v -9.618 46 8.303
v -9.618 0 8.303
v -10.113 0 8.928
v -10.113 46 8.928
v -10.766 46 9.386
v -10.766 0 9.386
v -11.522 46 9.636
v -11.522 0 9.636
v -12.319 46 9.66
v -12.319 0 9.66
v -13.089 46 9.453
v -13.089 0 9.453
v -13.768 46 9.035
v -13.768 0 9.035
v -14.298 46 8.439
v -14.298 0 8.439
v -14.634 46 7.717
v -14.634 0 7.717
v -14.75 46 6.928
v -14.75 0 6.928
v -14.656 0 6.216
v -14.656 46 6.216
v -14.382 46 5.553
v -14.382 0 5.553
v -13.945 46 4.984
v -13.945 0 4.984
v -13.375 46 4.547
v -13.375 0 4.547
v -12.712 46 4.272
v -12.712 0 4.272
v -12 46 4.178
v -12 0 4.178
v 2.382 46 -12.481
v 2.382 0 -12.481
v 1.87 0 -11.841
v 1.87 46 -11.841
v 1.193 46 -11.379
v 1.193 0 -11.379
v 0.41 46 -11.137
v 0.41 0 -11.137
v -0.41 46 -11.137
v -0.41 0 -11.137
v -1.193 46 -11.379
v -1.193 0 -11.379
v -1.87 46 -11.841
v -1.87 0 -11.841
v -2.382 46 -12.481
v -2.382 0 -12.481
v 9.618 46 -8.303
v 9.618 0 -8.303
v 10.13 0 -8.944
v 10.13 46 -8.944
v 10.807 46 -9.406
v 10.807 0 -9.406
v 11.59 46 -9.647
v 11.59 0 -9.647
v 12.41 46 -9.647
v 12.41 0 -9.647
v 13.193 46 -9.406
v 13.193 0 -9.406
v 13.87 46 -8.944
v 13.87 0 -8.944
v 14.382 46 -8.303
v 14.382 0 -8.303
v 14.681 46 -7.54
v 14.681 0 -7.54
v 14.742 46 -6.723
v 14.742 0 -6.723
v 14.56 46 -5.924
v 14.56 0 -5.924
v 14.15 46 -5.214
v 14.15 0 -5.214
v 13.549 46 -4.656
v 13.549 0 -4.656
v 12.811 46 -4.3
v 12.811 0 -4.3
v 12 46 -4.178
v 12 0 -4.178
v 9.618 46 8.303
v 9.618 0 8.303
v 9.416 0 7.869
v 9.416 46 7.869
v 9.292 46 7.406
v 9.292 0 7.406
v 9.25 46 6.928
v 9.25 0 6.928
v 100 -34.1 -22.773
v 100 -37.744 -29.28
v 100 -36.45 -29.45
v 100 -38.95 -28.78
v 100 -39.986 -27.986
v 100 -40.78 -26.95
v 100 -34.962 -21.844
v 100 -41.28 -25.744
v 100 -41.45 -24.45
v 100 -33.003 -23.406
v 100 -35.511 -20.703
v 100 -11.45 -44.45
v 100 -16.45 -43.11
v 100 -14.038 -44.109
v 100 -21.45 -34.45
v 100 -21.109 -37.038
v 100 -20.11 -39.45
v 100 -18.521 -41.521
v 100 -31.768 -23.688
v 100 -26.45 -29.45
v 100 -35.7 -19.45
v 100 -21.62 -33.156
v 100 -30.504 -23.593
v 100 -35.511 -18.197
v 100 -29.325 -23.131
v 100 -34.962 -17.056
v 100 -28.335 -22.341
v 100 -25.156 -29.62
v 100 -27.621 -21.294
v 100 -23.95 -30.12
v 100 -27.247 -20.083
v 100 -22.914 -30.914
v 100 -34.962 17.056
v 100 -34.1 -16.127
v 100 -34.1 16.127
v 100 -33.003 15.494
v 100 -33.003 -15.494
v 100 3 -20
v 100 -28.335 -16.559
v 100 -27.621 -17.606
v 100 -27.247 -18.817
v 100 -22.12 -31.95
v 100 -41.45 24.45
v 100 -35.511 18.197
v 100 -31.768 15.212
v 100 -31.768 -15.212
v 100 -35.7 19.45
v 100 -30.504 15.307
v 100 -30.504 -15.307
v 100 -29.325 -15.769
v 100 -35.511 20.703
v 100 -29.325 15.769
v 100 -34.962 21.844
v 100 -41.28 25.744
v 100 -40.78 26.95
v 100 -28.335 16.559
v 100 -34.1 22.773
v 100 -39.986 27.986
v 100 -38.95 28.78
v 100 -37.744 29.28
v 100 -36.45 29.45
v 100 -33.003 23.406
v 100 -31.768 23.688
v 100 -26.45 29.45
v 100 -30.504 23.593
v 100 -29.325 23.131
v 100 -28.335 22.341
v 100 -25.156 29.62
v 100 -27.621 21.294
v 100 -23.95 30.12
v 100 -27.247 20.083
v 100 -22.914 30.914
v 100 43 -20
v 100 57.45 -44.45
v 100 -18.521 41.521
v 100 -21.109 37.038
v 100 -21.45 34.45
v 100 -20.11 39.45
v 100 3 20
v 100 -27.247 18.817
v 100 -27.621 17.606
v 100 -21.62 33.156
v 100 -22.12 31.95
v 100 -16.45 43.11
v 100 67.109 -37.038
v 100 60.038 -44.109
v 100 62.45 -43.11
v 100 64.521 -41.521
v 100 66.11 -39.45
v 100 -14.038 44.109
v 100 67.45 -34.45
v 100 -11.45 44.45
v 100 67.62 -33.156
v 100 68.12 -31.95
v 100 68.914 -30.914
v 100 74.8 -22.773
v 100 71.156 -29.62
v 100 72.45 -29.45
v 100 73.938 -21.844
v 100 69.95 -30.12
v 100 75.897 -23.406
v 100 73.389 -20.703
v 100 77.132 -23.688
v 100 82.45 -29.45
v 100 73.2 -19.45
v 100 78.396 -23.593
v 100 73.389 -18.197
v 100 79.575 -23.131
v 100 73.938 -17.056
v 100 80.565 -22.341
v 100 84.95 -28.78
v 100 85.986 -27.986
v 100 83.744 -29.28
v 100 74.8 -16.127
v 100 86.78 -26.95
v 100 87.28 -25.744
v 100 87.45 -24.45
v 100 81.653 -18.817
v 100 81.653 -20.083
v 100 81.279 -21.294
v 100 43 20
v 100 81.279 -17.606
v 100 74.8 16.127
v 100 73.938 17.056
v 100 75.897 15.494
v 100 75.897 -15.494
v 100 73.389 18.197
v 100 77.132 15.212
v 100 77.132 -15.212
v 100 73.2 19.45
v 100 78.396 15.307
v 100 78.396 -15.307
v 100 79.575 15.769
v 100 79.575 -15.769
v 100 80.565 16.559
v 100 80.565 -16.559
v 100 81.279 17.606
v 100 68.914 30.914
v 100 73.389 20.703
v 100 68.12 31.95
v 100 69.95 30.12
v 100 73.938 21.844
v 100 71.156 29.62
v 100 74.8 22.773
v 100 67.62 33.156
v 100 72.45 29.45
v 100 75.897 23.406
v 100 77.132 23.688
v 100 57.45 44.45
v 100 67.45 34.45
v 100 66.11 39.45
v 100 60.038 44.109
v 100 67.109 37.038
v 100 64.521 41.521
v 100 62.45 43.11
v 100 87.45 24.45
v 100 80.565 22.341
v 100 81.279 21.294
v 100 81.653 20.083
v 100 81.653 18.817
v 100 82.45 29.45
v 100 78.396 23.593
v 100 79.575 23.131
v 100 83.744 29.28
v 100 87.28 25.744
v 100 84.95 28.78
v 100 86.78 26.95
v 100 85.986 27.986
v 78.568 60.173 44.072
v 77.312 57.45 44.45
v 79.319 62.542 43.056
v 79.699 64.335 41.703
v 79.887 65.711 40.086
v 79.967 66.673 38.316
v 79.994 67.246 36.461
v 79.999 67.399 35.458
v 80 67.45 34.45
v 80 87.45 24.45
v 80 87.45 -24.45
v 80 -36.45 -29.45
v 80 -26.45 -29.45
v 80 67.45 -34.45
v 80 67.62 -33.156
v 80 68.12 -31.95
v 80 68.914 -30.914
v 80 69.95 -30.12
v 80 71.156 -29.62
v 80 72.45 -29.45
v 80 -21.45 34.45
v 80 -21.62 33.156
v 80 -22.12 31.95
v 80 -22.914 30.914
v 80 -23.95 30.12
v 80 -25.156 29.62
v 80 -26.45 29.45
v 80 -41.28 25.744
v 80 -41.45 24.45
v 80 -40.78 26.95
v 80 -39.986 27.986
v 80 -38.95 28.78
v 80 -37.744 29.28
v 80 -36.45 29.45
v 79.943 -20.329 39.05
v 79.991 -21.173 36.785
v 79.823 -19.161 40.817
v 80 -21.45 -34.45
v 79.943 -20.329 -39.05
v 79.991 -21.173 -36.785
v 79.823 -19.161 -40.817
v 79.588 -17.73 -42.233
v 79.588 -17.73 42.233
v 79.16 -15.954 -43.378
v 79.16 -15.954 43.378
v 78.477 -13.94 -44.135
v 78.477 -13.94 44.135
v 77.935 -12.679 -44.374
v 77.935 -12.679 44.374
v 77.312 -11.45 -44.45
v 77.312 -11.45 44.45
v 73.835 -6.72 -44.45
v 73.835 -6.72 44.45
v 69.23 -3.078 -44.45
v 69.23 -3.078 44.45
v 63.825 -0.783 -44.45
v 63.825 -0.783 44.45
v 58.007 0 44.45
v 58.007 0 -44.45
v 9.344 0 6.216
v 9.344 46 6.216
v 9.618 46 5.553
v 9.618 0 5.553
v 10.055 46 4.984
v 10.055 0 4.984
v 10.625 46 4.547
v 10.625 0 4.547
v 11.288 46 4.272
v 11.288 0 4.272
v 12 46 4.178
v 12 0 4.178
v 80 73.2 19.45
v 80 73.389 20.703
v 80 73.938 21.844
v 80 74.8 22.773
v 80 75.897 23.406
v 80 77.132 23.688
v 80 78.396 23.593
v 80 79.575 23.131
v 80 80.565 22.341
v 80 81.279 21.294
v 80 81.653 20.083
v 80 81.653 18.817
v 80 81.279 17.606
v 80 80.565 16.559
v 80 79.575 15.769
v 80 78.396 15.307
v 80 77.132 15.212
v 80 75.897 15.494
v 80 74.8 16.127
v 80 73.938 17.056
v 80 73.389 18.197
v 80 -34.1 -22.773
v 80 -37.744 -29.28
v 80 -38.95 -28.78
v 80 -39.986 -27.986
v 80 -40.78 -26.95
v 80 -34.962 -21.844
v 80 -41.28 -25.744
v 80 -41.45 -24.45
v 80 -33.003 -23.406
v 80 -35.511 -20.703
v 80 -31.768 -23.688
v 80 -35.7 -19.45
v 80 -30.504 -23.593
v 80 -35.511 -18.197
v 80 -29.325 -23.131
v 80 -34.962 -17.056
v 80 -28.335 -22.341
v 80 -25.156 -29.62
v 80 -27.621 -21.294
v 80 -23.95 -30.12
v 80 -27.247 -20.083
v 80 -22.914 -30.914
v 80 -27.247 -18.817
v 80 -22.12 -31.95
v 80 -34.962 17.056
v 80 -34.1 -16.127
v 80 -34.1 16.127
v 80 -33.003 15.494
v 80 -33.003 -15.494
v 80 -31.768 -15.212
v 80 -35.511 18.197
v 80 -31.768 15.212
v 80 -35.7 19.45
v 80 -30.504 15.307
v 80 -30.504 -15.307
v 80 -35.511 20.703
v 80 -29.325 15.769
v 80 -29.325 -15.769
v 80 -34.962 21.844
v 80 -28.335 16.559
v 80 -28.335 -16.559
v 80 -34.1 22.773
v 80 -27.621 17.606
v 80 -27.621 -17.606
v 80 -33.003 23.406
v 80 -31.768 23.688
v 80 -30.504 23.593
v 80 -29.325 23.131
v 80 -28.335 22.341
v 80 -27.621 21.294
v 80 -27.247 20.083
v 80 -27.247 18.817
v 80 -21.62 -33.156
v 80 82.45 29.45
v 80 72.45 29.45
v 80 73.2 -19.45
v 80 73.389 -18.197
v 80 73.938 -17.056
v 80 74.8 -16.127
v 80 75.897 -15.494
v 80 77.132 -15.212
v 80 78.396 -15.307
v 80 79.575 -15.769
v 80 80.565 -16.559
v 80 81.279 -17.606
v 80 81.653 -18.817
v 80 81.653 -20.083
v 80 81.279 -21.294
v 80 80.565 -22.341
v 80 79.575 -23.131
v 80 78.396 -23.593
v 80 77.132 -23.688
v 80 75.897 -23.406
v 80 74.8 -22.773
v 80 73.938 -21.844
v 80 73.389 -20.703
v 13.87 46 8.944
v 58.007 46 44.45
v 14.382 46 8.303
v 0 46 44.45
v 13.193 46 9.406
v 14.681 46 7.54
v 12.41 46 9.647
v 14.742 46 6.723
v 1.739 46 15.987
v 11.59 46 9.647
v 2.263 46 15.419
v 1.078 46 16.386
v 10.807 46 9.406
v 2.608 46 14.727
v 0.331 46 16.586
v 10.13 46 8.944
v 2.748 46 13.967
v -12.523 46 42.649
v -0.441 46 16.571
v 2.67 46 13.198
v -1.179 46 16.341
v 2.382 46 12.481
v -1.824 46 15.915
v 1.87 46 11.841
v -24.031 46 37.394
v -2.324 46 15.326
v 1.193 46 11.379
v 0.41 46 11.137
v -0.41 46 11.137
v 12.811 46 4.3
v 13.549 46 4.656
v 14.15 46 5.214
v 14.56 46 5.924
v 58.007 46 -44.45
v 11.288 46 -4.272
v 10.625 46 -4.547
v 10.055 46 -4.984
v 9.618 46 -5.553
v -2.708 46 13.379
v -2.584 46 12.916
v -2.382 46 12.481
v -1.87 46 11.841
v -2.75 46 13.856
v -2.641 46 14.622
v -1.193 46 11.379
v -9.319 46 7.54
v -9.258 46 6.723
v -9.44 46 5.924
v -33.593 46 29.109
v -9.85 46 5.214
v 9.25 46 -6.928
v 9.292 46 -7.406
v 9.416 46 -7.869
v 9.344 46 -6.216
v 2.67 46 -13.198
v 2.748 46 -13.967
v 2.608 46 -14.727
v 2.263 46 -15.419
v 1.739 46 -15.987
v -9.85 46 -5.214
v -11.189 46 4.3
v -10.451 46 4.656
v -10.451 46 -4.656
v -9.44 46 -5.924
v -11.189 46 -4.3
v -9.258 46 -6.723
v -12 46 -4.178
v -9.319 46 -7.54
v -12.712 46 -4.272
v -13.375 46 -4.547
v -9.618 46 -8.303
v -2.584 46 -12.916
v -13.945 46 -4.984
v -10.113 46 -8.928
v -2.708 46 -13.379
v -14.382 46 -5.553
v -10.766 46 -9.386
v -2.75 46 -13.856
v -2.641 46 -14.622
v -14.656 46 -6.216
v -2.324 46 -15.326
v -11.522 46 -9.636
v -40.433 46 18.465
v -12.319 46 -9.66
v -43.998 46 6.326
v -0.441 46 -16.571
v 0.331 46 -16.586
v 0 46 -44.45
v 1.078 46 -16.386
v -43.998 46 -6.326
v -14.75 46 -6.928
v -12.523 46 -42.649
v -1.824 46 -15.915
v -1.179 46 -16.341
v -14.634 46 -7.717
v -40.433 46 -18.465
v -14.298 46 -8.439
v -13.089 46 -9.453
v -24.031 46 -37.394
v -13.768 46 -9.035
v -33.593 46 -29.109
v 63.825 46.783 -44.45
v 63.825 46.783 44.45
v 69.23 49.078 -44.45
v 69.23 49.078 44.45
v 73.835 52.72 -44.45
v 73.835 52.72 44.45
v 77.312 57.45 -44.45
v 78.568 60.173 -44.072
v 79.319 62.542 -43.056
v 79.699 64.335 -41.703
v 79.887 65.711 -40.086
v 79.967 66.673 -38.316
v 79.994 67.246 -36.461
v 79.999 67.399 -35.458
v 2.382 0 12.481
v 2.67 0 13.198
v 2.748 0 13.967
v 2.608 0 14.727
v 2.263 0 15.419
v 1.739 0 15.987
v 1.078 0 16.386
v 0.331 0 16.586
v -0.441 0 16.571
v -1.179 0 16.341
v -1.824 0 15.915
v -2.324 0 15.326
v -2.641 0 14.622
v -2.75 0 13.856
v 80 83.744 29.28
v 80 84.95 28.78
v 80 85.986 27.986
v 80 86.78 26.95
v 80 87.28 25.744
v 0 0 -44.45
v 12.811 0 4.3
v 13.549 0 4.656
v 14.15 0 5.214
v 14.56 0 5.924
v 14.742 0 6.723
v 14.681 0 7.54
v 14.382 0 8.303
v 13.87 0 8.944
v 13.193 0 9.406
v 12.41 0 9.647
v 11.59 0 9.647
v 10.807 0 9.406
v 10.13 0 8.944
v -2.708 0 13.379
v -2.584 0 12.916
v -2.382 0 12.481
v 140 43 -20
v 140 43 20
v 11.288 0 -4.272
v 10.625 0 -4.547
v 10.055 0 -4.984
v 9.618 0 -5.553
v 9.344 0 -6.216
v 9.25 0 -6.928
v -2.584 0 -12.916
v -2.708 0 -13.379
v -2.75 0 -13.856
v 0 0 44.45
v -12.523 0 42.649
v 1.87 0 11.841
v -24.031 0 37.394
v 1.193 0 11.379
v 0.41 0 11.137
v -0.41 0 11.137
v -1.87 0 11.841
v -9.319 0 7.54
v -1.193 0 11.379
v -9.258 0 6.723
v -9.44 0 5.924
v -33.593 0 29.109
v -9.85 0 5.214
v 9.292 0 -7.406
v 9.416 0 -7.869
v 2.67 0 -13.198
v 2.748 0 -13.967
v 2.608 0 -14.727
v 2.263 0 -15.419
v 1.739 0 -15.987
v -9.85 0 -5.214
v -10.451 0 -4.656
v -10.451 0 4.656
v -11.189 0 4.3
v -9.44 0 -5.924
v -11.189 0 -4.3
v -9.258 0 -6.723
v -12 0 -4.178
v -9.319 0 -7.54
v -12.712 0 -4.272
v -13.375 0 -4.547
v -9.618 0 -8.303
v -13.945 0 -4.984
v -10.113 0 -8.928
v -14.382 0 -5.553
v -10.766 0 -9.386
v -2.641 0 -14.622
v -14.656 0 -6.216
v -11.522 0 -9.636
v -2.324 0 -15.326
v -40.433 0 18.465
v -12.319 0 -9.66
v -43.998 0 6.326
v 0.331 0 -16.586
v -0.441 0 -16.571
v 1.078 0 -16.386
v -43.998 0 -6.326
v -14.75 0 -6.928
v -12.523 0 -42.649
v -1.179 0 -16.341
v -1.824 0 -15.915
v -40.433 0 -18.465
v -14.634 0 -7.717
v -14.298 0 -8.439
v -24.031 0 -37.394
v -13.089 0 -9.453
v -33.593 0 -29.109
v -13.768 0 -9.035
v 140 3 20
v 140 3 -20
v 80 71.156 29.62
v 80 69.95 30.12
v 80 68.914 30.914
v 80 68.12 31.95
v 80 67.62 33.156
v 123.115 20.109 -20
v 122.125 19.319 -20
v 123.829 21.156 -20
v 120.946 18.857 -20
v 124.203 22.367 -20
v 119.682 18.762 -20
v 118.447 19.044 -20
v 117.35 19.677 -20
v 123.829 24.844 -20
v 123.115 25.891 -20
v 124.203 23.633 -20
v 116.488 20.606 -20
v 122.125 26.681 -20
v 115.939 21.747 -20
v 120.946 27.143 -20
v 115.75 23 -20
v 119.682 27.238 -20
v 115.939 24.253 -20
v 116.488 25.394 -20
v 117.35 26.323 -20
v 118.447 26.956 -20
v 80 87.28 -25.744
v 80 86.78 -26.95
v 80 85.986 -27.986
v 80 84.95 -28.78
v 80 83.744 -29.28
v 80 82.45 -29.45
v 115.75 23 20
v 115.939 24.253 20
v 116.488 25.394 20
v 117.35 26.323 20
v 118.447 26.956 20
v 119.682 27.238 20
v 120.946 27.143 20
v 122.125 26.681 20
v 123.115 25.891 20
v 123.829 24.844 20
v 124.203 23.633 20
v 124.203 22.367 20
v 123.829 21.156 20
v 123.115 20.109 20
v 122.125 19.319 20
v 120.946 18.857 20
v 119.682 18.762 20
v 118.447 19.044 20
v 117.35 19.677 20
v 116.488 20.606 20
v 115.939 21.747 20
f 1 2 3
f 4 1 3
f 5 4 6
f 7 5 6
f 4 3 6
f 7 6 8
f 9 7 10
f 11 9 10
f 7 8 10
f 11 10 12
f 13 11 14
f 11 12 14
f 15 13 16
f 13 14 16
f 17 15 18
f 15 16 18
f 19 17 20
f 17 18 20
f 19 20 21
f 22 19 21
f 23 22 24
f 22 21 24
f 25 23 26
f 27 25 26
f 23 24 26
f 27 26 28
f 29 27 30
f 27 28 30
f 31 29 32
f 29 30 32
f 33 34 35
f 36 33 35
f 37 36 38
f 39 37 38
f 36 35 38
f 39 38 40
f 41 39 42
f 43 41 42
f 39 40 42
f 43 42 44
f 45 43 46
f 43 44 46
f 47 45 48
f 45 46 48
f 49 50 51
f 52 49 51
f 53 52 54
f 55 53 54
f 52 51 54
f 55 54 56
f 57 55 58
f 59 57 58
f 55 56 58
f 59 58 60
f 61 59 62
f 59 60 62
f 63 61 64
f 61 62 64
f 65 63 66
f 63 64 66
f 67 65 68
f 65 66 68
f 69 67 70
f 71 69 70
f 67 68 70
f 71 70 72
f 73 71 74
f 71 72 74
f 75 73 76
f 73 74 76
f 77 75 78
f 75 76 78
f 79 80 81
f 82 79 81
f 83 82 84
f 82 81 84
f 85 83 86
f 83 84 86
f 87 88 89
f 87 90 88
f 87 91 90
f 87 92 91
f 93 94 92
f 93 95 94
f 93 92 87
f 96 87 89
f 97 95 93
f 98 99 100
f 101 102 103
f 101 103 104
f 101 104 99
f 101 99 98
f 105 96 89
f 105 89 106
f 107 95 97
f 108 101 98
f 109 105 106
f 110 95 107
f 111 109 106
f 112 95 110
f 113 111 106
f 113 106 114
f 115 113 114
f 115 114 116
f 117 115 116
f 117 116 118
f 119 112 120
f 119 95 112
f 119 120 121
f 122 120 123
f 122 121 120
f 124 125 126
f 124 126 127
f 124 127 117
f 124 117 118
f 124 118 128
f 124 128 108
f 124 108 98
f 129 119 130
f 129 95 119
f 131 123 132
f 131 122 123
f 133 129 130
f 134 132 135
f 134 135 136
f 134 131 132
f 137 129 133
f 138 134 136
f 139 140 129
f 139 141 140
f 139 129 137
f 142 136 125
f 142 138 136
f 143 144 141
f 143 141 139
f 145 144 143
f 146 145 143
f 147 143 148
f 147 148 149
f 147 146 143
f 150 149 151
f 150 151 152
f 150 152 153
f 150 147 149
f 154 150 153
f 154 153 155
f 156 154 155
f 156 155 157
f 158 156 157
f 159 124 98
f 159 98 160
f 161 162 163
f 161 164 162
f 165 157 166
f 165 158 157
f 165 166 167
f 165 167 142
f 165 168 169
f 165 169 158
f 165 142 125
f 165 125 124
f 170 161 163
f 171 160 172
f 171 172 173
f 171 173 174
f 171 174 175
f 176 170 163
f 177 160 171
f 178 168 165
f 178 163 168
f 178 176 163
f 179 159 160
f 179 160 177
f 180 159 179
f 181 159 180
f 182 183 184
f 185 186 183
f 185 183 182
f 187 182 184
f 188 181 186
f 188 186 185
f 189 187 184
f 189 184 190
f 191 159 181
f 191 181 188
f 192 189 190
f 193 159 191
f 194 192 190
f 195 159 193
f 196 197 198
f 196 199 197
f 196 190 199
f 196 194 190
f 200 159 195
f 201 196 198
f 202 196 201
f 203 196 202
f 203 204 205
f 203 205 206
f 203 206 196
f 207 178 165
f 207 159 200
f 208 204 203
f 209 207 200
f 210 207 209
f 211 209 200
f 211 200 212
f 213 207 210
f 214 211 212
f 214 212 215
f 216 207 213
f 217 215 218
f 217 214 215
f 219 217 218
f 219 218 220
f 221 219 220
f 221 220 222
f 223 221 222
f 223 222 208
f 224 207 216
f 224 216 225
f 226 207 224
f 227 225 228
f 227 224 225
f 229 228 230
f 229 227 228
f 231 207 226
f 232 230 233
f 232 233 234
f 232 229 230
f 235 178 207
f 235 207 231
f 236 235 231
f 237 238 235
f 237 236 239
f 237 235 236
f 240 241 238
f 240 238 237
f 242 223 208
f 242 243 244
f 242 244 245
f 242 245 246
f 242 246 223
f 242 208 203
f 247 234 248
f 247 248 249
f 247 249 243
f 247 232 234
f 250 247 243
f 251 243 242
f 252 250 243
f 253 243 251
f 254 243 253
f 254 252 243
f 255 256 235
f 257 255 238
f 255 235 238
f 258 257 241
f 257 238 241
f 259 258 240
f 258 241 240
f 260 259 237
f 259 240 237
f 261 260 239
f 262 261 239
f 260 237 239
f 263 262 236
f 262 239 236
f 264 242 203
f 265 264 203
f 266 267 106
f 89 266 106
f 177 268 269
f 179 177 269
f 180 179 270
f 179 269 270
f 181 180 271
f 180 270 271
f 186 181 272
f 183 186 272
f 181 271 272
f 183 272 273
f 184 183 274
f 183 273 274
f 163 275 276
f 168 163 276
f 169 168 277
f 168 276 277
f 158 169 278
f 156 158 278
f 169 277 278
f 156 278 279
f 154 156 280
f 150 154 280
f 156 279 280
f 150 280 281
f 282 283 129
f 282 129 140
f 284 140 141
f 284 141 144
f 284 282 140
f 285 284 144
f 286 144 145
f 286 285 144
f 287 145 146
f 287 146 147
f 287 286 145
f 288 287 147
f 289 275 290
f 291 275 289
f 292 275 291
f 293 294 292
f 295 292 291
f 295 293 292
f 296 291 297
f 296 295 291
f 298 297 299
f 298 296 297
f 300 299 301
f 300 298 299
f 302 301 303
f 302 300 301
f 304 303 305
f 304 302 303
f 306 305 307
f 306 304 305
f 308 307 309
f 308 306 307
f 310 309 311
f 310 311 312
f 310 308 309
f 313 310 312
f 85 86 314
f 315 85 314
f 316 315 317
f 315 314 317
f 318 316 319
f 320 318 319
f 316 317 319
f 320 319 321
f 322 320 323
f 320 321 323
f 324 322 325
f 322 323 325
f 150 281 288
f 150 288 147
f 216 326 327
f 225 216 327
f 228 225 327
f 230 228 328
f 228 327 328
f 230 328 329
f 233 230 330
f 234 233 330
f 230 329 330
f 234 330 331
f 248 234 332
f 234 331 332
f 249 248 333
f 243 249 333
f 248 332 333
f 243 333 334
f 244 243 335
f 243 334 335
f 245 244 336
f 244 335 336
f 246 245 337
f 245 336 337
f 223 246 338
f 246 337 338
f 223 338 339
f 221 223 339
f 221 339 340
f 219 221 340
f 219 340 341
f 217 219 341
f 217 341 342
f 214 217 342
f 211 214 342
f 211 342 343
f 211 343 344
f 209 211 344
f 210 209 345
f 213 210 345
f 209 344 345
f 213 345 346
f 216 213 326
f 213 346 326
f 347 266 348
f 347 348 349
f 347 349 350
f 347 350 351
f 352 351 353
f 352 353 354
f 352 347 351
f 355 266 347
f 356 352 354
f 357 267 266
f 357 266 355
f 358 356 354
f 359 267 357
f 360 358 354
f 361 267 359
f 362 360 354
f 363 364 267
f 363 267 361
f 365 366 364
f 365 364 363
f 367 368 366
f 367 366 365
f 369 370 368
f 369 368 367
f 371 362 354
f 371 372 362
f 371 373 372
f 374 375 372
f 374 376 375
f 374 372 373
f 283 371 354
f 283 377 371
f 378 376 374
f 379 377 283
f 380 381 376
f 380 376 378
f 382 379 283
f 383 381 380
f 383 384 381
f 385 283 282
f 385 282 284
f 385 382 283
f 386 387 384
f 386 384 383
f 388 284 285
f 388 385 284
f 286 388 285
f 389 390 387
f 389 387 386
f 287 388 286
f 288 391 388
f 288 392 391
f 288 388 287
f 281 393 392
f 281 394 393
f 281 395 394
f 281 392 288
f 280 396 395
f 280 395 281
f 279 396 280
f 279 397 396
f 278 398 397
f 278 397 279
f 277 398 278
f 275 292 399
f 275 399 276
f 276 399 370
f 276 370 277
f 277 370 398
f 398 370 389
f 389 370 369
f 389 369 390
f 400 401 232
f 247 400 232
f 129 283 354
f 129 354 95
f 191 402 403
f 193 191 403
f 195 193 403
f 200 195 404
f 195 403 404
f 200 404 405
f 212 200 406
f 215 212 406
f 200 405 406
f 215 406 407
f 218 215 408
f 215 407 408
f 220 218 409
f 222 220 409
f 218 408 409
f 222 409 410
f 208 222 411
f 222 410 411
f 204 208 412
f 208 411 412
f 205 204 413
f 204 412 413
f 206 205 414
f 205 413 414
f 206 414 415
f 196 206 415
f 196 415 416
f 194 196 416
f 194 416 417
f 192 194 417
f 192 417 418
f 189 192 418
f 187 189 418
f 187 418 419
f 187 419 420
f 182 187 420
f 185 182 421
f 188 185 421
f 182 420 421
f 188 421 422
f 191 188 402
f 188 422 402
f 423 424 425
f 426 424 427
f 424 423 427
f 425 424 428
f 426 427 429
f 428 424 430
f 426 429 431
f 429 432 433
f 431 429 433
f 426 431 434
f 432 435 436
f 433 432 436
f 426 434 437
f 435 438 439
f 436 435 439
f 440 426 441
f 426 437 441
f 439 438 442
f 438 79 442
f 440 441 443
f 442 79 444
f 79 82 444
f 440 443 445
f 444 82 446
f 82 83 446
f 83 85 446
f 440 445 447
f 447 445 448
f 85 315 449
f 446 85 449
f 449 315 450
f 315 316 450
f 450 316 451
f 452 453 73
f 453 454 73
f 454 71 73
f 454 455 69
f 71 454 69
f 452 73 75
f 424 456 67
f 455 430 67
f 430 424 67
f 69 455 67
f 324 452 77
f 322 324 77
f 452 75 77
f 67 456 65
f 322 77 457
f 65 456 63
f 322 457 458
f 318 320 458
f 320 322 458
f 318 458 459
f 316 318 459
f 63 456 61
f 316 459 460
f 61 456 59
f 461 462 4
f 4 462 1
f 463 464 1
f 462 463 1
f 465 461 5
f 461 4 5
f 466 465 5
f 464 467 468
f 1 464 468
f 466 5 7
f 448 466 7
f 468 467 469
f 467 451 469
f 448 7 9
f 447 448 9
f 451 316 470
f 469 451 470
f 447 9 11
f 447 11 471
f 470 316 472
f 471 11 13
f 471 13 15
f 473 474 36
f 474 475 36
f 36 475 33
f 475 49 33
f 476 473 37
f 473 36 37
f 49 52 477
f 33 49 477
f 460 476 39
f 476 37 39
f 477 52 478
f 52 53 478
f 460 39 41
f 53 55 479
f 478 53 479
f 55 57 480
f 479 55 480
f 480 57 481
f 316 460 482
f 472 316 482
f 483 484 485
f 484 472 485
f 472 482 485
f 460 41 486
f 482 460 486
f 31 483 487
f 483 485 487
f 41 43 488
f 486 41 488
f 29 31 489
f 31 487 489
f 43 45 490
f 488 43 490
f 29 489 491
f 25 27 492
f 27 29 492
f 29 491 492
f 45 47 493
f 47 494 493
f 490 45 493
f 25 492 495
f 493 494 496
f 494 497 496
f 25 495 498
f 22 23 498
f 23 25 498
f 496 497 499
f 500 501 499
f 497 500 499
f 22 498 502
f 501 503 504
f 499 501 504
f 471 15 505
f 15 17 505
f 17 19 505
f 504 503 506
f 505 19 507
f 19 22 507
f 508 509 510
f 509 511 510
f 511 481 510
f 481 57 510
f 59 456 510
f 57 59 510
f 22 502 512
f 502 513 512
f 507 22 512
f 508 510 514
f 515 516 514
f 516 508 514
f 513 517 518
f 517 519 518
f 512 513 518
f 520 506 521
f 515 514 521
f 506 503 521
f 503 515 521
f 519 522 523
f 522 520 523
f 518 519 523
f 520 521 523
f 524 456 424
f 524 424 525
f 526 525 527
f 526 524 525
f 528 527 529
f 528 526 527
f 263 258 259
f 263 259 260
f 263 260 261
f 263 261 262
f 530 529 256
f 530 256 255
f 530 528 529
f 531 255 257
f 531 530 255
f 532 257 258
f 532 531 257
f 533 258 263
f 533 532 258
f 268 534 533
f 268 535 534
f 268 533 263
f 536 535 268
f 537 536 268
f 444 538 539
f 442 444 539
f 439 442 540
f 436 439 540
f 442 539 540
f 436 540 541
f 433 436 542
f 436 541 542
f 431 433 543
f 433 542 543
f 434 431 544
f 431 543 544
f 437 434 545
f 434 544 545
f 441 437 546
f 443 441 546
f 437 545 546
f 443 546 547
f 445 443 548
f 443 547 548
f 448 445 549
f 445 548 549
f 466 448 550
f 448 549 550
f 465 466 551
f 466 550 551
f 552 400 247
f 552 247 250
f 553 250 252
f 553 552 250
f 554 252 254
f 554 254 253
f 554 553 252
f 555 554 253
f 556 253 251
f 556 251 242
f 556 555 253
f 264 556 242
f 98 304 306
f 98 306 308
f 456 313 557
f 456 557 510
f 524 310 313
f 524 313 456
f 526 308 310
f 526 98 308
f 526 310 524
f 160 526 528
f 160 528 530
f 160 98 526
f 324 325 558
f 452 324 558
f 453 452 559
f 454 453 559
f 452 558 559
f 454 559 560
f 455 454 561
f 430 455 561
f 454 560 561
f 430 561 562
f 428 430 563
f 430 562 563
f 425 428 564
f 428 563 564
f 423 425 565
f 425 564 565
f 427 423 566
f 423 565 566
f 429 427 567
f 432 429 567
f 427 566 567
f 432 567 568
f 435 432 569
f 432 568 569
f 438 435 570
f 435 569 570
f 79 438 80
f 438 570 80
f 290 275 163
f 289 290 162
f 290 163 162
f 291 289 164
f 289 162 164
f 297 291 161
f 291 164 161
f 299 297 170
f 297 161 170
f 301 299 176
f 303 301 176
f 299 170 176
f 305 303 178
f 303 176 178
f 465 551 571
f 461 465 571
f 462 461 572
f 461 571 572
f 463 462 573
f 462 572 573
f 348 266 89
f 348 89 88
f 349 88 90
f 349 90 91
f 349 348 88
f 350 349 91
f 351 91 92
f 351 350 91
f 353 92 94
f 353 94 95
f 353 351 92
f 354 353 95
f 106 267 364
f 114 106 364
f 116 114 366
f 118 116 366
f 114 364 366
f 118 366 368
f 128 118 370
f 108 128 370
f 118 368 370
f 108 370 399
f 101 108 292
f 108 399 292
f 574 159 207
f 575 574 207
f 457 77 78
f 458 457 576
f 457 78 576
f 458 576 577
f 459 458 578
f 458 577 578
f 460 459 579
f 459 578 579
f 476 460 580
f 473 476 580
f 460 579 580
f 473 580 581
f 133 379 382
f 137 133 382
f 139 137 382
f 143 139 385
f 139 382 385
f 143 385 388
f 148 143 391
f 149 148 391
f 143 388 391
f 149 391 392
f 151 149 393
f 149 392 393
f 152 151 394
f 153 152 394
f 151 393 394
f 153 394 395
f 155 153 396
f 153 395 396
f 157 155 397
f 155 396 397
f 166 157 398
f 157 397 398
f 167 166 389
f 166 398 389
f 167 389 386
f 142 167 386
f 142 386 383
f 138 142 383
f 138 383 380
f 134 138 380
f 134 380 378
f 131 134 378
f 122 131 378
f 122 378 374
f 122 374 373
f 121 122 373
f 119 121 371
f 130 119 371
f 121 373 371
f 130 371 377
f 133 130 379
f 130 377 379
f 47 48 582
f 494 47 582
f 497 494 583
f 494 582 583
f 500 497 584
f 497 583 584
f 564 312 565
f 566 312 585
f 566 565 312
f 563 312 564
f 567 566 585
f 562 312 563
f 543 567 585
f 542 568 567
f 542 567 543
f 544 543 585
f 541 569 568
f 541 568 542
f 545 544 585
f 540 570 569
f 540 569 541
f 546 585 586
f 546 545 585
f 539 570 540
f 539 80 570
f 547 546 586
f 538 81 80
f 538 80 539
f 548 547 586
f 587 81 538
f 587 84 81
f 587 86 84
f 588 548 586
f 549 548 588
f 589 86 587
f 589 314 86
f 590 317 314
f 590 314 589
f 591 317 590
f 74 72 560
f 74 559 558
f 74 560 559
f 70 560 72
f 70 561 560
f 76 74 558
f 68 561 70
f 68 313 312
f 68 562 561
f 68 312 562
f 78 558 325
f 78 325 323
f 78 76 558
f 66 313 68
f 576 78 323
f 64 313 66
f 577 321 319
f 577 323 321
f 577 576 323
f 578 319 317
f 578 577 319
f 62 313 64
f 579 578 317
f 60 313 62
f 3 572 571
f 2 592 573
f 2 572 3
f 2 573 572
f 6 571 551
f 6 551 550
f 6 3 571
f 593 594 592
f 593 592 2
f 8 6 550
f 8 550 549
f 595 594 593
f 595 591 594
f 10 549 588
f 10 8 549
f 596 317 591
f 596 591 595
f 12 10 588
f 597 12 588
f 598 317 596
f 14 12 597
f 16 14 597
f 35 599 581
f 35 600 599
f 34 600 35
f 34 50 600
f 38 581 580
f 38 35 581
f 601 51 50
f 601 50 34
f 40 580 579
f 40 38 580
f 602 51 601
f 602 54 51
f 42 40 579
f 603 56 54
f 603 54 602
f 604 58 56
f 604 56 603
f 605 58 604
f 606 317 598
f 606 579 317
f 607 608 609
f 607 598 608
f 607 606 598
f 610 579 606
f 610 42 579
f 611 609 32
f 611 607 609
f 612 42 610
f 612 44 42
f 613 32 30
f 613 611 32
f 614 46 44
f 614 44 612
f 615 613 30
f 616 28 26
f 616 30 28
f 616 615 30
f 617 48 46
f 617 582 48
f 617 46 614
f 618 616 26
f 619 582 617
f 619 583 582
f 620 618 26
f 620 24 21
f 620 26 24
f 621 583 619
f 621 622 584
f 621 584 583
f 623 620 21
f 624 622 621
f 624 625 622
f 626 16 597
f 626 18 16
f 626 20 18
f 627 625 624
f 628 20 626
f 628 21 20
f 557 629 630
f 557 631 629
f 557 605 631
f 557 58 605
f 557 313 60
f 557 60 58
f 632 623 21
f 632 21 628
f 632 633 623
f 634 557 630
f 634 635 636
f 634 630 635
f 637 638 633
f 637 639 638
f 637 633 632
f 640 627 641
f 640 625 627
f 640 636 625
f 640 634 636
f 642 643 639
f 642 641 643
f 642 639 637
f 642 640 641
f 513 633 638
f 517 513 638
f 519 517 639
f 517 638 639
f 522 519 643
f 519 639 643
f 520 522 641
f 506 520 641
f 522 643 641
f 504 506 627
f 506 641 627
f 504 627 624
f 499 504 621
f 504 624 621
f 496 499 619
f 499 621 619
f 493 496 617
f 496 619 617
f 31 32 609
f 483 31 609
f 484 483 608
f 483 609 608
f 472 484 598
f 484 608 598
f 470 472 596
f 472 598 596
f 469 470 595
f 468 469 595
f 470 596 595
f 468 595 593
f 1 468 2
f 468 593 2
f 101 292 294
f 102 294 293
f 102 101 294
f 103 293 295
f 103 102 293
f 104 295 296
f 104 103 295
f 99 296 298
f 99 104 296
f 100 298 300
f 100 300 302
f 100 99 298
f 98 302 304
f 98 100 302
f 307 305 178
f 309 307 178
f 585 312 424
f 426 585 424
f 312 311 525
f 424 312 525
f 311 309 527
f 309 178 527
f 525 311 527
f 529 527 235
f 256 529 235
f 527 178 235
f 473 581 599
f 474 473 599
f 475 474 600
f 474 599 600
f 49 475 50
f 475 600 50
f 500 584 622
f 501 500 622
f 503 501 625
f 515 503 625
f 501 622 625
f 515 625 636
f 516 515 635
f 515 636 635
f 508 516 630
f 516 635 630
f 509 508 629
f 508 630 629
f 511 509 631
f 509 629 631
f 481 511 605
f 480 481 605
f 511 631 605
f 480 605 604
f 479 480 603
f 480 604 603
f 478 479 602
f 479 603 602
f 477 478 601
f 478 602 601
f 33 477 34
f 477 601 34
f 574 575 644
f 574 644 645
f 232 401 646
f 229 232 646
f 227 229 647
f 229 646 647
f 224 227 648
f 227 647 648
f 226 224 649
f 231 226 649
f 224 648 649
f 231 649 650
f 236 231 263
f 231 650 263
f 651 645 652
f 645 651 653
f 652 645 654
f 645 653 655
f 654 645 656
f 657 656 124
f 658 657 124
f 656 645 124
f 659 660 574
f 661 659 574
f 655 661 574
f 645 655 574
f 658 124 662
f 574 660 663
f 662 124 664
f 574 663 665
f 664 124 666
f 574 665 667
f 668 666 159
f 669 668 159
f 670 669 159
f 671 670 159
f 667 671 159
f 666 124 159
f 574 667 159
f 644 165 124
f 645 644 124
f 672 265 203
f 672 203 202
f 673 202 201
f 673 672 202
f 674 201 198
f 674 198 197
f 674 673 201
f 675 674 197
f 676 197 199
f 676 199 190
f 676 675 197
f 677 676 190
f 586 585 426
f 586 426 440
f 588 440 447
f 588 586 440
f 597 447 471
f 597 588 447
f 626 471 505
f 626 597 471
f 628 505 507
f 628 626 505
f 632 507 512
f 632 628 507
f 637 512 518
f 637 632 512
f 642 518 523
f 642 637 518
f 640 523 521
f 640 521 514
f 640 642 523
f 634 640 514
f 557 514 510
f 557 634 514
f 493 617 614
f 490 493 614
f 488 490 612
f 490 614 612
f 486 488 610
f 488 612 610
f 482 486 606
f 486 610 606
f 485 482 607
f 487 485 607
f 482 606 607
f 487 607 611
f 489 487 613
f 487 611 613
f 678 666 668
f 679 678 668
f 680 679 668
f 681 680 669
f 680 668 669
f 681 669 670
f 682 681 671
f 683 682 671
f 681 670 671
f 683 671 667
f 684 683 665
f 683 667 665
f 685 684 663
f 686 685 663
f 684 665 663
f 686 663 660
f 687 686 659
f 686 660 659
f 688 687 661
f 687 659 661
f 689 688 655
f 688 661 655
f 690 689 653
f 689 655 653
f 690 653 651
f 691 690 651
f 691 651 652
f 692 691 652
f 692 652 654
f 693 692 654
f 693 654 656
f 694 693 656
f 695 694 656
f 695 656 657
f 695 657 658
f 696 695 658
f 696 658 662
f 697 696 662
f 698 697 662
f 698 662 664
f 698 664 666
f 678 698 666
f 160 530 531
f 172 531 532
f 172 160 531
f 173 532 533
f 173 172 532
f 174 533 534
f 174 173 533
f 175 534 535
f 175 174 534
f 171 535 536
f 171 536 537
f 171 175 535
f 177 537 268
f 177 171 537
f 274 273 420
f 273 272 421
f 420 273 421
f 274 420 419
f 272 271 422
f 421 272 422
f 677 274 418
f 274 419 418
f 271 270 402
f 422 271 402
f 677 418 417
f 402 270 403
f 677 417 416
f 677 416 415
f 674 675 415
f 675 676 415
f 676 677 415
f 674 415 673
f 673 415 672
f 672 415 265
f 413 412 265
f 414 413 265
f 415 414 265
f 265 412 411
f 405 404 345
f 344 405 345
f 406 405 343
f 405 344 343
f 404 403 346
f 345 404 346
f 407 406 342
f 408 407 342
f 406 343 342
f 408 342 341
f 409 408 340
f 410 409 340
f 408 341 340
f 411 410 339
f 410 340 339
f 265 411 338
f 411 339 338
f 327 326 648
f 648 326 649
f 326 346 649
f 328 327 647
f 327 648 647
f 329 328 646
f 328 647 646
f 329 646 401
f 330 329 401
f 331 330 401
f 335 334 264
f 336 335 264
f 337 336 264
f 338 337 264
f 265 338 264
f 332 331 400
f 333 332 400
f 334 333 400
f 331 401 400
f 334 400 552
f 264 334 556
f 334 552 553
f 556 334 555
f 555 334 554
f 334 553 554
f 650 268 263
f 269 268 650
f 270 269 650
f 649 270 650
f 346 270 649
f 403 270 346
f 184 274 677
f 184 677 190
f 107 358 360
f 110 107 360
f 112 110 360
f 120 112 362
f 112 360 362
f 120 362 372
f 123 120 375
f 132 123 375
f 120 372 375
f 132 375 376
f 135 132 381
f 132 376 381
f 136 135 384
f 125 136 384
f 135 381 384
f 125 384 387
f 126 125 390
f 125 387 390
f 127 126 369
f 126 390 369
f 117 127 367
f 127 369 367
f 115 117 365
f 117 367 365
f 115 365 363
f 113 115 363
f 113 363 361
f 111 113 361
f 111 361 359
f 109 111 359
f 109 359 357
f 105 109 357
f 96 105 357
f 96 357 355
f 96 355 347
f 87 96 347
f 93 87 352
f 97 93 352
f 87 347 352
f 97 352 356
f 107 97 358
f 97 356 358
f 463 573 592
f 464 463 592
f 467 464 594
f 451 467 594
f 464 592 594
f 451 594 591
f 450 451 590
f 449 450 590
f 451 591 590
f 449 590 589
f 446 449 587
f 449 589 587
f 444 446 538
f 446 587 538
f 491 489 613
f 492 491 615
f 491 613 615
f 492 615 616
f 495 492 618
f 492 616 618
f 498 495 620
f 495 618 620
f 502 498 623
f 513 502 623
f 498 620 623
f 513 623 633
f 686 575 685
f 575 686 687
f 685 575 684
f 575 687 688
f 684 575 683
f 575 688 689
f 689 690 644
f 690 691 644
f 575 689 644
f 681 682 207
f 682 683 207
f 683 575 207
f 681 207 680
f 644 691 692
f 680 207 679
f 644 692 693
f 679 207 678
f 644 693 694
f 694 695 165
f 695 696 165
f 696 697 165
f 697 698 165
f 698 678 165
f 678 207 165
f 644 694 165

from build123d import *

# Parameters (mm, degrees)
BOSS_EXTRUDE1_DEPTH = 46
CUT_EXTRUDE2_DEPTH  = 76
SKETCH3_W           = 88.9
SKETCH3_H           = 88.9
BOSS_EXTRUDE2_DEPTH = 20
FILLET1_R           = 22
BOSS_EXTRUDE3_DEPTH = 40
SKETCH7_W           = 20
SKETCH7_H           = 20
BOSS_EXTRUDE4_DEPTH = 20
SKETCH8_W           = 20
SKETCH8_H           = 20
BOSS_EXTRUDE5_DEPTH = 20
FILLET3_R           = 10
SKETCH10_R          = 4.25
CUT_EXTRUDE4_DEPTH  = 20
SKETCH11_R          = 4.25
CUT_EXTRUDE5_DEPTH  = 102
SKETCH12_W          = 18.9
SKETCH12_H          = 20
BOSS_EXTRUDE6_DEPTH = 20
FILLET4_START       = 79
FILLET4_DEPTH       = 22
FILLET4_START_2     = 80
FILLET4_2_DEPTH     = 20


with BuildPart() as part:
    # Sketch1 → Boss-Extrude1 (new body)
    with BuildSketch(Plane(origin=(0, 0, 0), x_dir=(1, 0, 0), z_dir=(0, 1, 0))):
        with BuildLine():
            Line((0, 44.45), (80, 44.45))
            Line((80, 44.45), (80, -44.45))
            Line((80, -44.45), (0, -44.45))
            ThreePointArc((0, -44.45), (-44.45, 0), (0, 44.45))
        make_face()
    extrude(amount=BOSS_EXTRUDE1_DEPTH)

    # Sketch2 → Cut-Extrude2 (cut)
    with BuildSketch(Plane(origin=(0, 0, 0), x_dir=(-1, 0, 0), z_dir=(0, -1, 0))):
        with BuildLine():
            Line((-2.38156986, -12.481406461), (0, -13.856406461))
            Line((0, -13.856406461), (2.38156986, -12.481406461))
            ThreePointArc((2.38156986, -12.481406461), (0, -11.106406461), (-2.38156986, -12.481406461))
        make_face()
        with BuildLine():
            Line((2.38156986, -12.481406461), (0, -13.856406461))
            Line((0, -13.856406461), (-2.38156986, -12.481406461))
            ThreePointArc((-2.38156986, -12.481406461), (-0.711752374, -16.512702483), (2.75, -13.856406461))
            ThreePointArc((2.75, -13.856406461), (2.656296022, -13.144654087), (2.38156986, -12.481406461))
        make_face()
        with BuildLine():
            ThreePointArc((-12, -4.17820323), (-14.38156986, -8.30320323), (-9.61843014, -8.30320323))
            Line((-9.61843014, -8.30320323), (-12, -6.92820323))
            Line((-12, -6.92820323), (-12, -4.17820323))
        make_face()
        with BuildLine():
            Line((-12, -6.92820323), (-9.61843014, -8.30320323))
            ThreePointArc((-9.61843014, -8.30320323), (-9.343703978, -7.639955604), (-9.25, -6.92820323))
            ThreePointArc((-9.25, -6.92820323), (-10.055456352, -4.983659582), (-12, -4.17820323))
            Line((-12, -4.17820323), (-12, -6.92820323))
        make_face()
        with BuildLine():
            ThreePointArc((-9.61843014, 8.30320323), (-14.38156986, 8.30320323), (-12, 4.17820323))
            Line((-12, 4.17820323), (-12, 6.92820323))
            Line((-12, 6.92820323), (-9.61843014, 8.30320323))
        make_face()
        with BuildLine():
            Line((-12, 6.92820323), (-12, 4.17820323))
            ThreePointArc((-12, 4.17820323), (-10.055456352, 4.983659582), (-9.25, 6.92820323))
            ThreePointArc((-9.25, 6.92820323), (-9.343703978, 7.639955604), (-9.61843014, 8.30320323))
            Line((-9.61843014, 8.30320323), (-12, 6.92820323))
        make_face()
        with BuildLine():
            ThreePointArc((-2.38156986, 12.481406461), (0, 11.106406461), (2.38156986, 12.481406461))
            Line((2.38156986, 12.481406461), (0, 13.856406461))
            Line((0, 13.856406461), (-2.38156986, 12.481406461))
        make_face()
        with BuildLine():
            Line((0, 13.856406461), (2.38156986, 12.481406461))
            ThreePointArc((2.38156986, 12.481406461), (2.656296022, 13.144654087), (2.75, 13.856406461))
            ThreePointArc((2.75, 13.856406461), (-0.711752374, 16.512702483), (-2.38156986, 12.481406461))
            Line((-2.38156986, 12.481406461), (0, 13.856406461))
        make_face()
        with BuildLine():
            ThreePointArc((9.61843014, 8.30320323), (9.61843014, 5.55320323), (12, 4.17820323))
            Line((12, 4.17820323), (12, 6.92820323))
            Line((12, 6.92820323), (9.61843014, 8.30320323))
        make_face()
        with BuildLine():
            Line((12, 6.92820323), (12, 4.17820323))
            ThreePointArc((12, 4.17820323), (13.944543648, 4.983659582), (14.75, 6.92820323))
            ThreePointArc((14.75, 6.92820323), (12.711752374, 9.584499253), (9.61843014, 8.30320323))
            Line((9.61843014, 8.30320323), (12, 6.92820323))
        make_face()
        with BuildLine():
            ThreePointArc((12, -4.17820323), (9.61843014, -5.55320323), (9.61843014, -8.30320323))
            Line((9.61843014, -8.30320323), (12, -6.92820323))
            Line((12, -6.92820323), (12, -4.17820323))
        make_face()
        with BuildLine():
            Line((12, -6.92820323), (9.61843014, -8.30320323))
            ThreePointArc((9.61843014, -8.30320323), (12.711752374, -9.584499253), (14.75, -6.92820323))
            ThreePointArc((14.75, -6.92820323), (13.944543648, -4.983659582), (12, -4.17820323))
            Line((12, -4.17820323), (12, -6.92820323))
        make_face()
    extrude(amount=-CUT_EXTRUDE2_DEPTH, mode=Mode.SUBTRACT)

    # Sketch3 → Boss-Extrude2 (add)
    with BuildSketch(Plane(origin=(80, 0, 0), x_dir=(0, 0, -1), z_dir=(1, 0, 0))):
        with Locations((0, 23)):
            Rectangle(SKETCH3_W, SKETCH3_H)
    extrude(amount=BOSS_EXTRUDE2_DEPTH)

    # Fillet1
    # the kernel refuses this fillet: 22 mm, written as the material it adds along each edge
    with BuildSketch(Plane(origin=(80, 46, -44.45), x_dir=(0, 1, 0), z_dir=(0, 0, 1))) as fillet1_piece_1:
        with BuildLine():
            CenterArc((22, 21.993123925), FILLET1_R, 180, 88.567456262)
            Line((0, 21.993123925), (-0.44, 21.993123925))
            Line((-0.44, 21.993123925), (-0.44, 0))
            Line((-0.44, 0), (0, -0.44))
            ThreePointArc((0, -0.44), (10.725, -0.44), (21.439, -0.439862479))
            Line((21.439, -0.439862479), (21.45, 0))
        make_face()
    extrude(amount=88.9)
    with BuildSketch(Plane(origin=(80, 0, -44.45), x_dir=(0, -1, 0), z_dir=(0, 0, 1))) as fillet1_piece_2:
        with BuildLine():
            CenterArc((22, -21.993123925), FILLET1_R, 91.432543738, 88.567456262)
            Line((0, -21.993123925), (-0.44, -21.993123925))
            Line((-0.44, -21.993123925), (-0.44, 0))
            Line((-0.44, 0), (0, 0.44))
            ThreePointArc((0, 0.44), (10.725, 0.44), (21.439, 0.439862479))
            Line((21.439, 0.439862479), (21.45, 0))
        make_face()
    extrude(amount=88.9)

    # Sketch5 → Boss-Extrude3 (add)
    with BuildSketch(Plane(origin=(100, 0, 0), x_dir=(0, 0, -1), z_dir=(1, 0, 0))):
        Polygon((20, 43), (0, 43), (-20, 43), (-20, 3), (20, 3), align=None)
    extrude(amount=BOSS_EXTRUDE3_DEPTH)

    # Sketch7 → Boss-Extrude4 (add)
    with BuildSketch(Plane(origin=(0, 67.45, 0), x_dir=(1, 0, 0), z_dir=(0, 1, 0))):
        with Locations((90, 19.45)):
            Rectangle(SKETCH7_W, SKETCH7_H)
        with Locations((90, -19.45)):
            Rectangle(SKETCH7_W, SKETCH7_H)
    extrude(amount=BOSS_EXTRUDE4_DEPTH)

    # Sketch8 → Boss-Extrude5 (add)
    with BuildSketch(Plane.XZ.offset(21.45)):
        with Locations((90, 19.45)):
            Rectangle(SKETCH8_W, SKETCH8_H)
        with Locations((90, -19.45)):
            Rectangle(SKETCH8_W, SKETCH8_H)
    extrude(amount=BOSS_EXTRUDE5_DEPTH)

    # Fillet3
    fillet3_edges = [part.edges().sort_by_distance(p)[0] for p in [
        (90, -21.45, 44.45),
        (90, -21.45, -44.45),
        (90, 67.45, -44.45),
        (90, 67.45, 44.45),
    ]]
    fillet(fillet3_edges, radius=FILLET3_R)

    # Sketch10 → Cut-Extrude4 (cut)
    with BuildSketch(Plane.ZY.offset(-80)):
        with Locations(Location((-19.45, 77.45, 0), (0, 0, 270))):
            Circle(SKETCH10_R)
        with Locations(Location((19.45, 77.45, 0), (0, 0, 270))):
            Circle(SKETCH10_R)
        with Locations(Location((19.45, -31.45, 0), (0, 0, 270))):
            Circle(SKETCH10_R)
        with Locations(Location((-19.45, -31.45, 0), (0, 0, 270))):
            Circle(SKETCH10_R)
    extrude(amount=-CUT_EXTRUDE4_DEPTH, mode=Mode.SUBTRACT)

    # Sketch11 → Cut-Extrude5 (cut)
    with BuildSketch(Plane(origin=(0, 0, -20), x_dir=(-1, 0, 0), z_dir=(0, 0, -1))):
        with Locations((-120, 23)):
            Circle(SKETCH11_R)
    extrude(amount=-CUT_EXTRUDE5_DEPTH, mode=Mode.SUBTRACT)

    # Sketch12 → Boss-Extrude6 (add)
    with BuildSketch(Plane(origin=(100, 0, 0), x_dir=(0, 0, -1), z_dir=(1, 0, 0))):
        with Locations((0, 77.45)):
            Rectangle(SKETCH12_W, SKETCH12_H)
        with Locations((0, -31.45)):
            Rectangle(SKETCH12_W, SKETCH12_H)
    extrude(amount=-BOSS_EXTRUDE6_DEPTH)

    # Fillet4: read off the stored shape, not the designer's step
    # Fillet4 outline → Fillet4 (cut)
    with BuildSketch(Plane.YZ.offset(FILLET4_START)):
        with BuildLine():
            ThreePointArc((82.45, 29.45), (85.985533906, 27.985533906), (87.45, 24.45))
            Line((87.45, 24.45), (87.45, 29.45))
            Line((87.45, 29.45), (82.45, 29.45))
        make_face()
        with BuildLine():
            ThreePointArc((87.45, -24.45), (85.985533906, -27.985533906), (82.45, -29.45))
            Line((82.45, -29.45), (87.45, -29.45))
            Line((87.45, -29.45), (87.45, -24.45))
        make_face()
        with BuildLine():
            Line((-41.45, -29.45), (-36.45, -29.45))
            ThreePointArc((-36.45, -29.45), (-39.985533906, -27.985533906), (-41.45, -24.45))
            Line((-41.45, -24.45), (-41.45, -29.45))
        make_face()
        with BuildLine():
            Line((-41.45, 29.45), (-41.45, 24.45))
            ThreePointArc((-41.45, 24.45), (-39.985533906, 27.985533906), (-36.45, 29.45))
            Line((-36.45, 29.45), (-41.45, 29.45))
        make_face()
    extrude(amount=FILLET4_DEPTH, mode=Mode.SUBTRACT)

    # Fillet4 2 outline → Fillet4 2 (add)
    with BuildSketch(Plane.YZ.offset(FILLET4_START_2)):
        with BuildLine():
            Line((67.45, 29.45), (72.45, 29.45))
            ThreePointArc((72.45, 29.45), (68.914466094, 30.914466094), (67.45, 34.45))
            Line((67.45, 34.45), (67.45, 29.45))
        make_face()
        with BuildLine():
            ThreePointArc((67.45, -34.45), (68.914466094, -30.914466094), (72.45, -29.45))
            Line((72.45, -29.45), (67.45, -29.45))
            Line((67.45, -29.45), (67.45, -34.45))
        make_face()
        with BuildLine():
            Line((-21.45, -29.45), (-26.45, -29.45))
            ThreePointArc((-26.45, -29.45), (-22.914466094, -30.914466094), (-21.45, -34.45))
            Line((-21.45, -34.45), (-21.45, -29.45))
        make_face()
        with BuildLine():
            ThreePointArc((-21.45, 34.45), (-22.914466094, 30.914466094), (-26.45, 29.45))
            Line((-26.45, 29.45), (-21.45, 29.45))
            Line((-21.45, 29.45), (-21.45, 34.45))
        make_face()
    extrude(amount=FILLET4_2_DEPTH)


solid = part.part
